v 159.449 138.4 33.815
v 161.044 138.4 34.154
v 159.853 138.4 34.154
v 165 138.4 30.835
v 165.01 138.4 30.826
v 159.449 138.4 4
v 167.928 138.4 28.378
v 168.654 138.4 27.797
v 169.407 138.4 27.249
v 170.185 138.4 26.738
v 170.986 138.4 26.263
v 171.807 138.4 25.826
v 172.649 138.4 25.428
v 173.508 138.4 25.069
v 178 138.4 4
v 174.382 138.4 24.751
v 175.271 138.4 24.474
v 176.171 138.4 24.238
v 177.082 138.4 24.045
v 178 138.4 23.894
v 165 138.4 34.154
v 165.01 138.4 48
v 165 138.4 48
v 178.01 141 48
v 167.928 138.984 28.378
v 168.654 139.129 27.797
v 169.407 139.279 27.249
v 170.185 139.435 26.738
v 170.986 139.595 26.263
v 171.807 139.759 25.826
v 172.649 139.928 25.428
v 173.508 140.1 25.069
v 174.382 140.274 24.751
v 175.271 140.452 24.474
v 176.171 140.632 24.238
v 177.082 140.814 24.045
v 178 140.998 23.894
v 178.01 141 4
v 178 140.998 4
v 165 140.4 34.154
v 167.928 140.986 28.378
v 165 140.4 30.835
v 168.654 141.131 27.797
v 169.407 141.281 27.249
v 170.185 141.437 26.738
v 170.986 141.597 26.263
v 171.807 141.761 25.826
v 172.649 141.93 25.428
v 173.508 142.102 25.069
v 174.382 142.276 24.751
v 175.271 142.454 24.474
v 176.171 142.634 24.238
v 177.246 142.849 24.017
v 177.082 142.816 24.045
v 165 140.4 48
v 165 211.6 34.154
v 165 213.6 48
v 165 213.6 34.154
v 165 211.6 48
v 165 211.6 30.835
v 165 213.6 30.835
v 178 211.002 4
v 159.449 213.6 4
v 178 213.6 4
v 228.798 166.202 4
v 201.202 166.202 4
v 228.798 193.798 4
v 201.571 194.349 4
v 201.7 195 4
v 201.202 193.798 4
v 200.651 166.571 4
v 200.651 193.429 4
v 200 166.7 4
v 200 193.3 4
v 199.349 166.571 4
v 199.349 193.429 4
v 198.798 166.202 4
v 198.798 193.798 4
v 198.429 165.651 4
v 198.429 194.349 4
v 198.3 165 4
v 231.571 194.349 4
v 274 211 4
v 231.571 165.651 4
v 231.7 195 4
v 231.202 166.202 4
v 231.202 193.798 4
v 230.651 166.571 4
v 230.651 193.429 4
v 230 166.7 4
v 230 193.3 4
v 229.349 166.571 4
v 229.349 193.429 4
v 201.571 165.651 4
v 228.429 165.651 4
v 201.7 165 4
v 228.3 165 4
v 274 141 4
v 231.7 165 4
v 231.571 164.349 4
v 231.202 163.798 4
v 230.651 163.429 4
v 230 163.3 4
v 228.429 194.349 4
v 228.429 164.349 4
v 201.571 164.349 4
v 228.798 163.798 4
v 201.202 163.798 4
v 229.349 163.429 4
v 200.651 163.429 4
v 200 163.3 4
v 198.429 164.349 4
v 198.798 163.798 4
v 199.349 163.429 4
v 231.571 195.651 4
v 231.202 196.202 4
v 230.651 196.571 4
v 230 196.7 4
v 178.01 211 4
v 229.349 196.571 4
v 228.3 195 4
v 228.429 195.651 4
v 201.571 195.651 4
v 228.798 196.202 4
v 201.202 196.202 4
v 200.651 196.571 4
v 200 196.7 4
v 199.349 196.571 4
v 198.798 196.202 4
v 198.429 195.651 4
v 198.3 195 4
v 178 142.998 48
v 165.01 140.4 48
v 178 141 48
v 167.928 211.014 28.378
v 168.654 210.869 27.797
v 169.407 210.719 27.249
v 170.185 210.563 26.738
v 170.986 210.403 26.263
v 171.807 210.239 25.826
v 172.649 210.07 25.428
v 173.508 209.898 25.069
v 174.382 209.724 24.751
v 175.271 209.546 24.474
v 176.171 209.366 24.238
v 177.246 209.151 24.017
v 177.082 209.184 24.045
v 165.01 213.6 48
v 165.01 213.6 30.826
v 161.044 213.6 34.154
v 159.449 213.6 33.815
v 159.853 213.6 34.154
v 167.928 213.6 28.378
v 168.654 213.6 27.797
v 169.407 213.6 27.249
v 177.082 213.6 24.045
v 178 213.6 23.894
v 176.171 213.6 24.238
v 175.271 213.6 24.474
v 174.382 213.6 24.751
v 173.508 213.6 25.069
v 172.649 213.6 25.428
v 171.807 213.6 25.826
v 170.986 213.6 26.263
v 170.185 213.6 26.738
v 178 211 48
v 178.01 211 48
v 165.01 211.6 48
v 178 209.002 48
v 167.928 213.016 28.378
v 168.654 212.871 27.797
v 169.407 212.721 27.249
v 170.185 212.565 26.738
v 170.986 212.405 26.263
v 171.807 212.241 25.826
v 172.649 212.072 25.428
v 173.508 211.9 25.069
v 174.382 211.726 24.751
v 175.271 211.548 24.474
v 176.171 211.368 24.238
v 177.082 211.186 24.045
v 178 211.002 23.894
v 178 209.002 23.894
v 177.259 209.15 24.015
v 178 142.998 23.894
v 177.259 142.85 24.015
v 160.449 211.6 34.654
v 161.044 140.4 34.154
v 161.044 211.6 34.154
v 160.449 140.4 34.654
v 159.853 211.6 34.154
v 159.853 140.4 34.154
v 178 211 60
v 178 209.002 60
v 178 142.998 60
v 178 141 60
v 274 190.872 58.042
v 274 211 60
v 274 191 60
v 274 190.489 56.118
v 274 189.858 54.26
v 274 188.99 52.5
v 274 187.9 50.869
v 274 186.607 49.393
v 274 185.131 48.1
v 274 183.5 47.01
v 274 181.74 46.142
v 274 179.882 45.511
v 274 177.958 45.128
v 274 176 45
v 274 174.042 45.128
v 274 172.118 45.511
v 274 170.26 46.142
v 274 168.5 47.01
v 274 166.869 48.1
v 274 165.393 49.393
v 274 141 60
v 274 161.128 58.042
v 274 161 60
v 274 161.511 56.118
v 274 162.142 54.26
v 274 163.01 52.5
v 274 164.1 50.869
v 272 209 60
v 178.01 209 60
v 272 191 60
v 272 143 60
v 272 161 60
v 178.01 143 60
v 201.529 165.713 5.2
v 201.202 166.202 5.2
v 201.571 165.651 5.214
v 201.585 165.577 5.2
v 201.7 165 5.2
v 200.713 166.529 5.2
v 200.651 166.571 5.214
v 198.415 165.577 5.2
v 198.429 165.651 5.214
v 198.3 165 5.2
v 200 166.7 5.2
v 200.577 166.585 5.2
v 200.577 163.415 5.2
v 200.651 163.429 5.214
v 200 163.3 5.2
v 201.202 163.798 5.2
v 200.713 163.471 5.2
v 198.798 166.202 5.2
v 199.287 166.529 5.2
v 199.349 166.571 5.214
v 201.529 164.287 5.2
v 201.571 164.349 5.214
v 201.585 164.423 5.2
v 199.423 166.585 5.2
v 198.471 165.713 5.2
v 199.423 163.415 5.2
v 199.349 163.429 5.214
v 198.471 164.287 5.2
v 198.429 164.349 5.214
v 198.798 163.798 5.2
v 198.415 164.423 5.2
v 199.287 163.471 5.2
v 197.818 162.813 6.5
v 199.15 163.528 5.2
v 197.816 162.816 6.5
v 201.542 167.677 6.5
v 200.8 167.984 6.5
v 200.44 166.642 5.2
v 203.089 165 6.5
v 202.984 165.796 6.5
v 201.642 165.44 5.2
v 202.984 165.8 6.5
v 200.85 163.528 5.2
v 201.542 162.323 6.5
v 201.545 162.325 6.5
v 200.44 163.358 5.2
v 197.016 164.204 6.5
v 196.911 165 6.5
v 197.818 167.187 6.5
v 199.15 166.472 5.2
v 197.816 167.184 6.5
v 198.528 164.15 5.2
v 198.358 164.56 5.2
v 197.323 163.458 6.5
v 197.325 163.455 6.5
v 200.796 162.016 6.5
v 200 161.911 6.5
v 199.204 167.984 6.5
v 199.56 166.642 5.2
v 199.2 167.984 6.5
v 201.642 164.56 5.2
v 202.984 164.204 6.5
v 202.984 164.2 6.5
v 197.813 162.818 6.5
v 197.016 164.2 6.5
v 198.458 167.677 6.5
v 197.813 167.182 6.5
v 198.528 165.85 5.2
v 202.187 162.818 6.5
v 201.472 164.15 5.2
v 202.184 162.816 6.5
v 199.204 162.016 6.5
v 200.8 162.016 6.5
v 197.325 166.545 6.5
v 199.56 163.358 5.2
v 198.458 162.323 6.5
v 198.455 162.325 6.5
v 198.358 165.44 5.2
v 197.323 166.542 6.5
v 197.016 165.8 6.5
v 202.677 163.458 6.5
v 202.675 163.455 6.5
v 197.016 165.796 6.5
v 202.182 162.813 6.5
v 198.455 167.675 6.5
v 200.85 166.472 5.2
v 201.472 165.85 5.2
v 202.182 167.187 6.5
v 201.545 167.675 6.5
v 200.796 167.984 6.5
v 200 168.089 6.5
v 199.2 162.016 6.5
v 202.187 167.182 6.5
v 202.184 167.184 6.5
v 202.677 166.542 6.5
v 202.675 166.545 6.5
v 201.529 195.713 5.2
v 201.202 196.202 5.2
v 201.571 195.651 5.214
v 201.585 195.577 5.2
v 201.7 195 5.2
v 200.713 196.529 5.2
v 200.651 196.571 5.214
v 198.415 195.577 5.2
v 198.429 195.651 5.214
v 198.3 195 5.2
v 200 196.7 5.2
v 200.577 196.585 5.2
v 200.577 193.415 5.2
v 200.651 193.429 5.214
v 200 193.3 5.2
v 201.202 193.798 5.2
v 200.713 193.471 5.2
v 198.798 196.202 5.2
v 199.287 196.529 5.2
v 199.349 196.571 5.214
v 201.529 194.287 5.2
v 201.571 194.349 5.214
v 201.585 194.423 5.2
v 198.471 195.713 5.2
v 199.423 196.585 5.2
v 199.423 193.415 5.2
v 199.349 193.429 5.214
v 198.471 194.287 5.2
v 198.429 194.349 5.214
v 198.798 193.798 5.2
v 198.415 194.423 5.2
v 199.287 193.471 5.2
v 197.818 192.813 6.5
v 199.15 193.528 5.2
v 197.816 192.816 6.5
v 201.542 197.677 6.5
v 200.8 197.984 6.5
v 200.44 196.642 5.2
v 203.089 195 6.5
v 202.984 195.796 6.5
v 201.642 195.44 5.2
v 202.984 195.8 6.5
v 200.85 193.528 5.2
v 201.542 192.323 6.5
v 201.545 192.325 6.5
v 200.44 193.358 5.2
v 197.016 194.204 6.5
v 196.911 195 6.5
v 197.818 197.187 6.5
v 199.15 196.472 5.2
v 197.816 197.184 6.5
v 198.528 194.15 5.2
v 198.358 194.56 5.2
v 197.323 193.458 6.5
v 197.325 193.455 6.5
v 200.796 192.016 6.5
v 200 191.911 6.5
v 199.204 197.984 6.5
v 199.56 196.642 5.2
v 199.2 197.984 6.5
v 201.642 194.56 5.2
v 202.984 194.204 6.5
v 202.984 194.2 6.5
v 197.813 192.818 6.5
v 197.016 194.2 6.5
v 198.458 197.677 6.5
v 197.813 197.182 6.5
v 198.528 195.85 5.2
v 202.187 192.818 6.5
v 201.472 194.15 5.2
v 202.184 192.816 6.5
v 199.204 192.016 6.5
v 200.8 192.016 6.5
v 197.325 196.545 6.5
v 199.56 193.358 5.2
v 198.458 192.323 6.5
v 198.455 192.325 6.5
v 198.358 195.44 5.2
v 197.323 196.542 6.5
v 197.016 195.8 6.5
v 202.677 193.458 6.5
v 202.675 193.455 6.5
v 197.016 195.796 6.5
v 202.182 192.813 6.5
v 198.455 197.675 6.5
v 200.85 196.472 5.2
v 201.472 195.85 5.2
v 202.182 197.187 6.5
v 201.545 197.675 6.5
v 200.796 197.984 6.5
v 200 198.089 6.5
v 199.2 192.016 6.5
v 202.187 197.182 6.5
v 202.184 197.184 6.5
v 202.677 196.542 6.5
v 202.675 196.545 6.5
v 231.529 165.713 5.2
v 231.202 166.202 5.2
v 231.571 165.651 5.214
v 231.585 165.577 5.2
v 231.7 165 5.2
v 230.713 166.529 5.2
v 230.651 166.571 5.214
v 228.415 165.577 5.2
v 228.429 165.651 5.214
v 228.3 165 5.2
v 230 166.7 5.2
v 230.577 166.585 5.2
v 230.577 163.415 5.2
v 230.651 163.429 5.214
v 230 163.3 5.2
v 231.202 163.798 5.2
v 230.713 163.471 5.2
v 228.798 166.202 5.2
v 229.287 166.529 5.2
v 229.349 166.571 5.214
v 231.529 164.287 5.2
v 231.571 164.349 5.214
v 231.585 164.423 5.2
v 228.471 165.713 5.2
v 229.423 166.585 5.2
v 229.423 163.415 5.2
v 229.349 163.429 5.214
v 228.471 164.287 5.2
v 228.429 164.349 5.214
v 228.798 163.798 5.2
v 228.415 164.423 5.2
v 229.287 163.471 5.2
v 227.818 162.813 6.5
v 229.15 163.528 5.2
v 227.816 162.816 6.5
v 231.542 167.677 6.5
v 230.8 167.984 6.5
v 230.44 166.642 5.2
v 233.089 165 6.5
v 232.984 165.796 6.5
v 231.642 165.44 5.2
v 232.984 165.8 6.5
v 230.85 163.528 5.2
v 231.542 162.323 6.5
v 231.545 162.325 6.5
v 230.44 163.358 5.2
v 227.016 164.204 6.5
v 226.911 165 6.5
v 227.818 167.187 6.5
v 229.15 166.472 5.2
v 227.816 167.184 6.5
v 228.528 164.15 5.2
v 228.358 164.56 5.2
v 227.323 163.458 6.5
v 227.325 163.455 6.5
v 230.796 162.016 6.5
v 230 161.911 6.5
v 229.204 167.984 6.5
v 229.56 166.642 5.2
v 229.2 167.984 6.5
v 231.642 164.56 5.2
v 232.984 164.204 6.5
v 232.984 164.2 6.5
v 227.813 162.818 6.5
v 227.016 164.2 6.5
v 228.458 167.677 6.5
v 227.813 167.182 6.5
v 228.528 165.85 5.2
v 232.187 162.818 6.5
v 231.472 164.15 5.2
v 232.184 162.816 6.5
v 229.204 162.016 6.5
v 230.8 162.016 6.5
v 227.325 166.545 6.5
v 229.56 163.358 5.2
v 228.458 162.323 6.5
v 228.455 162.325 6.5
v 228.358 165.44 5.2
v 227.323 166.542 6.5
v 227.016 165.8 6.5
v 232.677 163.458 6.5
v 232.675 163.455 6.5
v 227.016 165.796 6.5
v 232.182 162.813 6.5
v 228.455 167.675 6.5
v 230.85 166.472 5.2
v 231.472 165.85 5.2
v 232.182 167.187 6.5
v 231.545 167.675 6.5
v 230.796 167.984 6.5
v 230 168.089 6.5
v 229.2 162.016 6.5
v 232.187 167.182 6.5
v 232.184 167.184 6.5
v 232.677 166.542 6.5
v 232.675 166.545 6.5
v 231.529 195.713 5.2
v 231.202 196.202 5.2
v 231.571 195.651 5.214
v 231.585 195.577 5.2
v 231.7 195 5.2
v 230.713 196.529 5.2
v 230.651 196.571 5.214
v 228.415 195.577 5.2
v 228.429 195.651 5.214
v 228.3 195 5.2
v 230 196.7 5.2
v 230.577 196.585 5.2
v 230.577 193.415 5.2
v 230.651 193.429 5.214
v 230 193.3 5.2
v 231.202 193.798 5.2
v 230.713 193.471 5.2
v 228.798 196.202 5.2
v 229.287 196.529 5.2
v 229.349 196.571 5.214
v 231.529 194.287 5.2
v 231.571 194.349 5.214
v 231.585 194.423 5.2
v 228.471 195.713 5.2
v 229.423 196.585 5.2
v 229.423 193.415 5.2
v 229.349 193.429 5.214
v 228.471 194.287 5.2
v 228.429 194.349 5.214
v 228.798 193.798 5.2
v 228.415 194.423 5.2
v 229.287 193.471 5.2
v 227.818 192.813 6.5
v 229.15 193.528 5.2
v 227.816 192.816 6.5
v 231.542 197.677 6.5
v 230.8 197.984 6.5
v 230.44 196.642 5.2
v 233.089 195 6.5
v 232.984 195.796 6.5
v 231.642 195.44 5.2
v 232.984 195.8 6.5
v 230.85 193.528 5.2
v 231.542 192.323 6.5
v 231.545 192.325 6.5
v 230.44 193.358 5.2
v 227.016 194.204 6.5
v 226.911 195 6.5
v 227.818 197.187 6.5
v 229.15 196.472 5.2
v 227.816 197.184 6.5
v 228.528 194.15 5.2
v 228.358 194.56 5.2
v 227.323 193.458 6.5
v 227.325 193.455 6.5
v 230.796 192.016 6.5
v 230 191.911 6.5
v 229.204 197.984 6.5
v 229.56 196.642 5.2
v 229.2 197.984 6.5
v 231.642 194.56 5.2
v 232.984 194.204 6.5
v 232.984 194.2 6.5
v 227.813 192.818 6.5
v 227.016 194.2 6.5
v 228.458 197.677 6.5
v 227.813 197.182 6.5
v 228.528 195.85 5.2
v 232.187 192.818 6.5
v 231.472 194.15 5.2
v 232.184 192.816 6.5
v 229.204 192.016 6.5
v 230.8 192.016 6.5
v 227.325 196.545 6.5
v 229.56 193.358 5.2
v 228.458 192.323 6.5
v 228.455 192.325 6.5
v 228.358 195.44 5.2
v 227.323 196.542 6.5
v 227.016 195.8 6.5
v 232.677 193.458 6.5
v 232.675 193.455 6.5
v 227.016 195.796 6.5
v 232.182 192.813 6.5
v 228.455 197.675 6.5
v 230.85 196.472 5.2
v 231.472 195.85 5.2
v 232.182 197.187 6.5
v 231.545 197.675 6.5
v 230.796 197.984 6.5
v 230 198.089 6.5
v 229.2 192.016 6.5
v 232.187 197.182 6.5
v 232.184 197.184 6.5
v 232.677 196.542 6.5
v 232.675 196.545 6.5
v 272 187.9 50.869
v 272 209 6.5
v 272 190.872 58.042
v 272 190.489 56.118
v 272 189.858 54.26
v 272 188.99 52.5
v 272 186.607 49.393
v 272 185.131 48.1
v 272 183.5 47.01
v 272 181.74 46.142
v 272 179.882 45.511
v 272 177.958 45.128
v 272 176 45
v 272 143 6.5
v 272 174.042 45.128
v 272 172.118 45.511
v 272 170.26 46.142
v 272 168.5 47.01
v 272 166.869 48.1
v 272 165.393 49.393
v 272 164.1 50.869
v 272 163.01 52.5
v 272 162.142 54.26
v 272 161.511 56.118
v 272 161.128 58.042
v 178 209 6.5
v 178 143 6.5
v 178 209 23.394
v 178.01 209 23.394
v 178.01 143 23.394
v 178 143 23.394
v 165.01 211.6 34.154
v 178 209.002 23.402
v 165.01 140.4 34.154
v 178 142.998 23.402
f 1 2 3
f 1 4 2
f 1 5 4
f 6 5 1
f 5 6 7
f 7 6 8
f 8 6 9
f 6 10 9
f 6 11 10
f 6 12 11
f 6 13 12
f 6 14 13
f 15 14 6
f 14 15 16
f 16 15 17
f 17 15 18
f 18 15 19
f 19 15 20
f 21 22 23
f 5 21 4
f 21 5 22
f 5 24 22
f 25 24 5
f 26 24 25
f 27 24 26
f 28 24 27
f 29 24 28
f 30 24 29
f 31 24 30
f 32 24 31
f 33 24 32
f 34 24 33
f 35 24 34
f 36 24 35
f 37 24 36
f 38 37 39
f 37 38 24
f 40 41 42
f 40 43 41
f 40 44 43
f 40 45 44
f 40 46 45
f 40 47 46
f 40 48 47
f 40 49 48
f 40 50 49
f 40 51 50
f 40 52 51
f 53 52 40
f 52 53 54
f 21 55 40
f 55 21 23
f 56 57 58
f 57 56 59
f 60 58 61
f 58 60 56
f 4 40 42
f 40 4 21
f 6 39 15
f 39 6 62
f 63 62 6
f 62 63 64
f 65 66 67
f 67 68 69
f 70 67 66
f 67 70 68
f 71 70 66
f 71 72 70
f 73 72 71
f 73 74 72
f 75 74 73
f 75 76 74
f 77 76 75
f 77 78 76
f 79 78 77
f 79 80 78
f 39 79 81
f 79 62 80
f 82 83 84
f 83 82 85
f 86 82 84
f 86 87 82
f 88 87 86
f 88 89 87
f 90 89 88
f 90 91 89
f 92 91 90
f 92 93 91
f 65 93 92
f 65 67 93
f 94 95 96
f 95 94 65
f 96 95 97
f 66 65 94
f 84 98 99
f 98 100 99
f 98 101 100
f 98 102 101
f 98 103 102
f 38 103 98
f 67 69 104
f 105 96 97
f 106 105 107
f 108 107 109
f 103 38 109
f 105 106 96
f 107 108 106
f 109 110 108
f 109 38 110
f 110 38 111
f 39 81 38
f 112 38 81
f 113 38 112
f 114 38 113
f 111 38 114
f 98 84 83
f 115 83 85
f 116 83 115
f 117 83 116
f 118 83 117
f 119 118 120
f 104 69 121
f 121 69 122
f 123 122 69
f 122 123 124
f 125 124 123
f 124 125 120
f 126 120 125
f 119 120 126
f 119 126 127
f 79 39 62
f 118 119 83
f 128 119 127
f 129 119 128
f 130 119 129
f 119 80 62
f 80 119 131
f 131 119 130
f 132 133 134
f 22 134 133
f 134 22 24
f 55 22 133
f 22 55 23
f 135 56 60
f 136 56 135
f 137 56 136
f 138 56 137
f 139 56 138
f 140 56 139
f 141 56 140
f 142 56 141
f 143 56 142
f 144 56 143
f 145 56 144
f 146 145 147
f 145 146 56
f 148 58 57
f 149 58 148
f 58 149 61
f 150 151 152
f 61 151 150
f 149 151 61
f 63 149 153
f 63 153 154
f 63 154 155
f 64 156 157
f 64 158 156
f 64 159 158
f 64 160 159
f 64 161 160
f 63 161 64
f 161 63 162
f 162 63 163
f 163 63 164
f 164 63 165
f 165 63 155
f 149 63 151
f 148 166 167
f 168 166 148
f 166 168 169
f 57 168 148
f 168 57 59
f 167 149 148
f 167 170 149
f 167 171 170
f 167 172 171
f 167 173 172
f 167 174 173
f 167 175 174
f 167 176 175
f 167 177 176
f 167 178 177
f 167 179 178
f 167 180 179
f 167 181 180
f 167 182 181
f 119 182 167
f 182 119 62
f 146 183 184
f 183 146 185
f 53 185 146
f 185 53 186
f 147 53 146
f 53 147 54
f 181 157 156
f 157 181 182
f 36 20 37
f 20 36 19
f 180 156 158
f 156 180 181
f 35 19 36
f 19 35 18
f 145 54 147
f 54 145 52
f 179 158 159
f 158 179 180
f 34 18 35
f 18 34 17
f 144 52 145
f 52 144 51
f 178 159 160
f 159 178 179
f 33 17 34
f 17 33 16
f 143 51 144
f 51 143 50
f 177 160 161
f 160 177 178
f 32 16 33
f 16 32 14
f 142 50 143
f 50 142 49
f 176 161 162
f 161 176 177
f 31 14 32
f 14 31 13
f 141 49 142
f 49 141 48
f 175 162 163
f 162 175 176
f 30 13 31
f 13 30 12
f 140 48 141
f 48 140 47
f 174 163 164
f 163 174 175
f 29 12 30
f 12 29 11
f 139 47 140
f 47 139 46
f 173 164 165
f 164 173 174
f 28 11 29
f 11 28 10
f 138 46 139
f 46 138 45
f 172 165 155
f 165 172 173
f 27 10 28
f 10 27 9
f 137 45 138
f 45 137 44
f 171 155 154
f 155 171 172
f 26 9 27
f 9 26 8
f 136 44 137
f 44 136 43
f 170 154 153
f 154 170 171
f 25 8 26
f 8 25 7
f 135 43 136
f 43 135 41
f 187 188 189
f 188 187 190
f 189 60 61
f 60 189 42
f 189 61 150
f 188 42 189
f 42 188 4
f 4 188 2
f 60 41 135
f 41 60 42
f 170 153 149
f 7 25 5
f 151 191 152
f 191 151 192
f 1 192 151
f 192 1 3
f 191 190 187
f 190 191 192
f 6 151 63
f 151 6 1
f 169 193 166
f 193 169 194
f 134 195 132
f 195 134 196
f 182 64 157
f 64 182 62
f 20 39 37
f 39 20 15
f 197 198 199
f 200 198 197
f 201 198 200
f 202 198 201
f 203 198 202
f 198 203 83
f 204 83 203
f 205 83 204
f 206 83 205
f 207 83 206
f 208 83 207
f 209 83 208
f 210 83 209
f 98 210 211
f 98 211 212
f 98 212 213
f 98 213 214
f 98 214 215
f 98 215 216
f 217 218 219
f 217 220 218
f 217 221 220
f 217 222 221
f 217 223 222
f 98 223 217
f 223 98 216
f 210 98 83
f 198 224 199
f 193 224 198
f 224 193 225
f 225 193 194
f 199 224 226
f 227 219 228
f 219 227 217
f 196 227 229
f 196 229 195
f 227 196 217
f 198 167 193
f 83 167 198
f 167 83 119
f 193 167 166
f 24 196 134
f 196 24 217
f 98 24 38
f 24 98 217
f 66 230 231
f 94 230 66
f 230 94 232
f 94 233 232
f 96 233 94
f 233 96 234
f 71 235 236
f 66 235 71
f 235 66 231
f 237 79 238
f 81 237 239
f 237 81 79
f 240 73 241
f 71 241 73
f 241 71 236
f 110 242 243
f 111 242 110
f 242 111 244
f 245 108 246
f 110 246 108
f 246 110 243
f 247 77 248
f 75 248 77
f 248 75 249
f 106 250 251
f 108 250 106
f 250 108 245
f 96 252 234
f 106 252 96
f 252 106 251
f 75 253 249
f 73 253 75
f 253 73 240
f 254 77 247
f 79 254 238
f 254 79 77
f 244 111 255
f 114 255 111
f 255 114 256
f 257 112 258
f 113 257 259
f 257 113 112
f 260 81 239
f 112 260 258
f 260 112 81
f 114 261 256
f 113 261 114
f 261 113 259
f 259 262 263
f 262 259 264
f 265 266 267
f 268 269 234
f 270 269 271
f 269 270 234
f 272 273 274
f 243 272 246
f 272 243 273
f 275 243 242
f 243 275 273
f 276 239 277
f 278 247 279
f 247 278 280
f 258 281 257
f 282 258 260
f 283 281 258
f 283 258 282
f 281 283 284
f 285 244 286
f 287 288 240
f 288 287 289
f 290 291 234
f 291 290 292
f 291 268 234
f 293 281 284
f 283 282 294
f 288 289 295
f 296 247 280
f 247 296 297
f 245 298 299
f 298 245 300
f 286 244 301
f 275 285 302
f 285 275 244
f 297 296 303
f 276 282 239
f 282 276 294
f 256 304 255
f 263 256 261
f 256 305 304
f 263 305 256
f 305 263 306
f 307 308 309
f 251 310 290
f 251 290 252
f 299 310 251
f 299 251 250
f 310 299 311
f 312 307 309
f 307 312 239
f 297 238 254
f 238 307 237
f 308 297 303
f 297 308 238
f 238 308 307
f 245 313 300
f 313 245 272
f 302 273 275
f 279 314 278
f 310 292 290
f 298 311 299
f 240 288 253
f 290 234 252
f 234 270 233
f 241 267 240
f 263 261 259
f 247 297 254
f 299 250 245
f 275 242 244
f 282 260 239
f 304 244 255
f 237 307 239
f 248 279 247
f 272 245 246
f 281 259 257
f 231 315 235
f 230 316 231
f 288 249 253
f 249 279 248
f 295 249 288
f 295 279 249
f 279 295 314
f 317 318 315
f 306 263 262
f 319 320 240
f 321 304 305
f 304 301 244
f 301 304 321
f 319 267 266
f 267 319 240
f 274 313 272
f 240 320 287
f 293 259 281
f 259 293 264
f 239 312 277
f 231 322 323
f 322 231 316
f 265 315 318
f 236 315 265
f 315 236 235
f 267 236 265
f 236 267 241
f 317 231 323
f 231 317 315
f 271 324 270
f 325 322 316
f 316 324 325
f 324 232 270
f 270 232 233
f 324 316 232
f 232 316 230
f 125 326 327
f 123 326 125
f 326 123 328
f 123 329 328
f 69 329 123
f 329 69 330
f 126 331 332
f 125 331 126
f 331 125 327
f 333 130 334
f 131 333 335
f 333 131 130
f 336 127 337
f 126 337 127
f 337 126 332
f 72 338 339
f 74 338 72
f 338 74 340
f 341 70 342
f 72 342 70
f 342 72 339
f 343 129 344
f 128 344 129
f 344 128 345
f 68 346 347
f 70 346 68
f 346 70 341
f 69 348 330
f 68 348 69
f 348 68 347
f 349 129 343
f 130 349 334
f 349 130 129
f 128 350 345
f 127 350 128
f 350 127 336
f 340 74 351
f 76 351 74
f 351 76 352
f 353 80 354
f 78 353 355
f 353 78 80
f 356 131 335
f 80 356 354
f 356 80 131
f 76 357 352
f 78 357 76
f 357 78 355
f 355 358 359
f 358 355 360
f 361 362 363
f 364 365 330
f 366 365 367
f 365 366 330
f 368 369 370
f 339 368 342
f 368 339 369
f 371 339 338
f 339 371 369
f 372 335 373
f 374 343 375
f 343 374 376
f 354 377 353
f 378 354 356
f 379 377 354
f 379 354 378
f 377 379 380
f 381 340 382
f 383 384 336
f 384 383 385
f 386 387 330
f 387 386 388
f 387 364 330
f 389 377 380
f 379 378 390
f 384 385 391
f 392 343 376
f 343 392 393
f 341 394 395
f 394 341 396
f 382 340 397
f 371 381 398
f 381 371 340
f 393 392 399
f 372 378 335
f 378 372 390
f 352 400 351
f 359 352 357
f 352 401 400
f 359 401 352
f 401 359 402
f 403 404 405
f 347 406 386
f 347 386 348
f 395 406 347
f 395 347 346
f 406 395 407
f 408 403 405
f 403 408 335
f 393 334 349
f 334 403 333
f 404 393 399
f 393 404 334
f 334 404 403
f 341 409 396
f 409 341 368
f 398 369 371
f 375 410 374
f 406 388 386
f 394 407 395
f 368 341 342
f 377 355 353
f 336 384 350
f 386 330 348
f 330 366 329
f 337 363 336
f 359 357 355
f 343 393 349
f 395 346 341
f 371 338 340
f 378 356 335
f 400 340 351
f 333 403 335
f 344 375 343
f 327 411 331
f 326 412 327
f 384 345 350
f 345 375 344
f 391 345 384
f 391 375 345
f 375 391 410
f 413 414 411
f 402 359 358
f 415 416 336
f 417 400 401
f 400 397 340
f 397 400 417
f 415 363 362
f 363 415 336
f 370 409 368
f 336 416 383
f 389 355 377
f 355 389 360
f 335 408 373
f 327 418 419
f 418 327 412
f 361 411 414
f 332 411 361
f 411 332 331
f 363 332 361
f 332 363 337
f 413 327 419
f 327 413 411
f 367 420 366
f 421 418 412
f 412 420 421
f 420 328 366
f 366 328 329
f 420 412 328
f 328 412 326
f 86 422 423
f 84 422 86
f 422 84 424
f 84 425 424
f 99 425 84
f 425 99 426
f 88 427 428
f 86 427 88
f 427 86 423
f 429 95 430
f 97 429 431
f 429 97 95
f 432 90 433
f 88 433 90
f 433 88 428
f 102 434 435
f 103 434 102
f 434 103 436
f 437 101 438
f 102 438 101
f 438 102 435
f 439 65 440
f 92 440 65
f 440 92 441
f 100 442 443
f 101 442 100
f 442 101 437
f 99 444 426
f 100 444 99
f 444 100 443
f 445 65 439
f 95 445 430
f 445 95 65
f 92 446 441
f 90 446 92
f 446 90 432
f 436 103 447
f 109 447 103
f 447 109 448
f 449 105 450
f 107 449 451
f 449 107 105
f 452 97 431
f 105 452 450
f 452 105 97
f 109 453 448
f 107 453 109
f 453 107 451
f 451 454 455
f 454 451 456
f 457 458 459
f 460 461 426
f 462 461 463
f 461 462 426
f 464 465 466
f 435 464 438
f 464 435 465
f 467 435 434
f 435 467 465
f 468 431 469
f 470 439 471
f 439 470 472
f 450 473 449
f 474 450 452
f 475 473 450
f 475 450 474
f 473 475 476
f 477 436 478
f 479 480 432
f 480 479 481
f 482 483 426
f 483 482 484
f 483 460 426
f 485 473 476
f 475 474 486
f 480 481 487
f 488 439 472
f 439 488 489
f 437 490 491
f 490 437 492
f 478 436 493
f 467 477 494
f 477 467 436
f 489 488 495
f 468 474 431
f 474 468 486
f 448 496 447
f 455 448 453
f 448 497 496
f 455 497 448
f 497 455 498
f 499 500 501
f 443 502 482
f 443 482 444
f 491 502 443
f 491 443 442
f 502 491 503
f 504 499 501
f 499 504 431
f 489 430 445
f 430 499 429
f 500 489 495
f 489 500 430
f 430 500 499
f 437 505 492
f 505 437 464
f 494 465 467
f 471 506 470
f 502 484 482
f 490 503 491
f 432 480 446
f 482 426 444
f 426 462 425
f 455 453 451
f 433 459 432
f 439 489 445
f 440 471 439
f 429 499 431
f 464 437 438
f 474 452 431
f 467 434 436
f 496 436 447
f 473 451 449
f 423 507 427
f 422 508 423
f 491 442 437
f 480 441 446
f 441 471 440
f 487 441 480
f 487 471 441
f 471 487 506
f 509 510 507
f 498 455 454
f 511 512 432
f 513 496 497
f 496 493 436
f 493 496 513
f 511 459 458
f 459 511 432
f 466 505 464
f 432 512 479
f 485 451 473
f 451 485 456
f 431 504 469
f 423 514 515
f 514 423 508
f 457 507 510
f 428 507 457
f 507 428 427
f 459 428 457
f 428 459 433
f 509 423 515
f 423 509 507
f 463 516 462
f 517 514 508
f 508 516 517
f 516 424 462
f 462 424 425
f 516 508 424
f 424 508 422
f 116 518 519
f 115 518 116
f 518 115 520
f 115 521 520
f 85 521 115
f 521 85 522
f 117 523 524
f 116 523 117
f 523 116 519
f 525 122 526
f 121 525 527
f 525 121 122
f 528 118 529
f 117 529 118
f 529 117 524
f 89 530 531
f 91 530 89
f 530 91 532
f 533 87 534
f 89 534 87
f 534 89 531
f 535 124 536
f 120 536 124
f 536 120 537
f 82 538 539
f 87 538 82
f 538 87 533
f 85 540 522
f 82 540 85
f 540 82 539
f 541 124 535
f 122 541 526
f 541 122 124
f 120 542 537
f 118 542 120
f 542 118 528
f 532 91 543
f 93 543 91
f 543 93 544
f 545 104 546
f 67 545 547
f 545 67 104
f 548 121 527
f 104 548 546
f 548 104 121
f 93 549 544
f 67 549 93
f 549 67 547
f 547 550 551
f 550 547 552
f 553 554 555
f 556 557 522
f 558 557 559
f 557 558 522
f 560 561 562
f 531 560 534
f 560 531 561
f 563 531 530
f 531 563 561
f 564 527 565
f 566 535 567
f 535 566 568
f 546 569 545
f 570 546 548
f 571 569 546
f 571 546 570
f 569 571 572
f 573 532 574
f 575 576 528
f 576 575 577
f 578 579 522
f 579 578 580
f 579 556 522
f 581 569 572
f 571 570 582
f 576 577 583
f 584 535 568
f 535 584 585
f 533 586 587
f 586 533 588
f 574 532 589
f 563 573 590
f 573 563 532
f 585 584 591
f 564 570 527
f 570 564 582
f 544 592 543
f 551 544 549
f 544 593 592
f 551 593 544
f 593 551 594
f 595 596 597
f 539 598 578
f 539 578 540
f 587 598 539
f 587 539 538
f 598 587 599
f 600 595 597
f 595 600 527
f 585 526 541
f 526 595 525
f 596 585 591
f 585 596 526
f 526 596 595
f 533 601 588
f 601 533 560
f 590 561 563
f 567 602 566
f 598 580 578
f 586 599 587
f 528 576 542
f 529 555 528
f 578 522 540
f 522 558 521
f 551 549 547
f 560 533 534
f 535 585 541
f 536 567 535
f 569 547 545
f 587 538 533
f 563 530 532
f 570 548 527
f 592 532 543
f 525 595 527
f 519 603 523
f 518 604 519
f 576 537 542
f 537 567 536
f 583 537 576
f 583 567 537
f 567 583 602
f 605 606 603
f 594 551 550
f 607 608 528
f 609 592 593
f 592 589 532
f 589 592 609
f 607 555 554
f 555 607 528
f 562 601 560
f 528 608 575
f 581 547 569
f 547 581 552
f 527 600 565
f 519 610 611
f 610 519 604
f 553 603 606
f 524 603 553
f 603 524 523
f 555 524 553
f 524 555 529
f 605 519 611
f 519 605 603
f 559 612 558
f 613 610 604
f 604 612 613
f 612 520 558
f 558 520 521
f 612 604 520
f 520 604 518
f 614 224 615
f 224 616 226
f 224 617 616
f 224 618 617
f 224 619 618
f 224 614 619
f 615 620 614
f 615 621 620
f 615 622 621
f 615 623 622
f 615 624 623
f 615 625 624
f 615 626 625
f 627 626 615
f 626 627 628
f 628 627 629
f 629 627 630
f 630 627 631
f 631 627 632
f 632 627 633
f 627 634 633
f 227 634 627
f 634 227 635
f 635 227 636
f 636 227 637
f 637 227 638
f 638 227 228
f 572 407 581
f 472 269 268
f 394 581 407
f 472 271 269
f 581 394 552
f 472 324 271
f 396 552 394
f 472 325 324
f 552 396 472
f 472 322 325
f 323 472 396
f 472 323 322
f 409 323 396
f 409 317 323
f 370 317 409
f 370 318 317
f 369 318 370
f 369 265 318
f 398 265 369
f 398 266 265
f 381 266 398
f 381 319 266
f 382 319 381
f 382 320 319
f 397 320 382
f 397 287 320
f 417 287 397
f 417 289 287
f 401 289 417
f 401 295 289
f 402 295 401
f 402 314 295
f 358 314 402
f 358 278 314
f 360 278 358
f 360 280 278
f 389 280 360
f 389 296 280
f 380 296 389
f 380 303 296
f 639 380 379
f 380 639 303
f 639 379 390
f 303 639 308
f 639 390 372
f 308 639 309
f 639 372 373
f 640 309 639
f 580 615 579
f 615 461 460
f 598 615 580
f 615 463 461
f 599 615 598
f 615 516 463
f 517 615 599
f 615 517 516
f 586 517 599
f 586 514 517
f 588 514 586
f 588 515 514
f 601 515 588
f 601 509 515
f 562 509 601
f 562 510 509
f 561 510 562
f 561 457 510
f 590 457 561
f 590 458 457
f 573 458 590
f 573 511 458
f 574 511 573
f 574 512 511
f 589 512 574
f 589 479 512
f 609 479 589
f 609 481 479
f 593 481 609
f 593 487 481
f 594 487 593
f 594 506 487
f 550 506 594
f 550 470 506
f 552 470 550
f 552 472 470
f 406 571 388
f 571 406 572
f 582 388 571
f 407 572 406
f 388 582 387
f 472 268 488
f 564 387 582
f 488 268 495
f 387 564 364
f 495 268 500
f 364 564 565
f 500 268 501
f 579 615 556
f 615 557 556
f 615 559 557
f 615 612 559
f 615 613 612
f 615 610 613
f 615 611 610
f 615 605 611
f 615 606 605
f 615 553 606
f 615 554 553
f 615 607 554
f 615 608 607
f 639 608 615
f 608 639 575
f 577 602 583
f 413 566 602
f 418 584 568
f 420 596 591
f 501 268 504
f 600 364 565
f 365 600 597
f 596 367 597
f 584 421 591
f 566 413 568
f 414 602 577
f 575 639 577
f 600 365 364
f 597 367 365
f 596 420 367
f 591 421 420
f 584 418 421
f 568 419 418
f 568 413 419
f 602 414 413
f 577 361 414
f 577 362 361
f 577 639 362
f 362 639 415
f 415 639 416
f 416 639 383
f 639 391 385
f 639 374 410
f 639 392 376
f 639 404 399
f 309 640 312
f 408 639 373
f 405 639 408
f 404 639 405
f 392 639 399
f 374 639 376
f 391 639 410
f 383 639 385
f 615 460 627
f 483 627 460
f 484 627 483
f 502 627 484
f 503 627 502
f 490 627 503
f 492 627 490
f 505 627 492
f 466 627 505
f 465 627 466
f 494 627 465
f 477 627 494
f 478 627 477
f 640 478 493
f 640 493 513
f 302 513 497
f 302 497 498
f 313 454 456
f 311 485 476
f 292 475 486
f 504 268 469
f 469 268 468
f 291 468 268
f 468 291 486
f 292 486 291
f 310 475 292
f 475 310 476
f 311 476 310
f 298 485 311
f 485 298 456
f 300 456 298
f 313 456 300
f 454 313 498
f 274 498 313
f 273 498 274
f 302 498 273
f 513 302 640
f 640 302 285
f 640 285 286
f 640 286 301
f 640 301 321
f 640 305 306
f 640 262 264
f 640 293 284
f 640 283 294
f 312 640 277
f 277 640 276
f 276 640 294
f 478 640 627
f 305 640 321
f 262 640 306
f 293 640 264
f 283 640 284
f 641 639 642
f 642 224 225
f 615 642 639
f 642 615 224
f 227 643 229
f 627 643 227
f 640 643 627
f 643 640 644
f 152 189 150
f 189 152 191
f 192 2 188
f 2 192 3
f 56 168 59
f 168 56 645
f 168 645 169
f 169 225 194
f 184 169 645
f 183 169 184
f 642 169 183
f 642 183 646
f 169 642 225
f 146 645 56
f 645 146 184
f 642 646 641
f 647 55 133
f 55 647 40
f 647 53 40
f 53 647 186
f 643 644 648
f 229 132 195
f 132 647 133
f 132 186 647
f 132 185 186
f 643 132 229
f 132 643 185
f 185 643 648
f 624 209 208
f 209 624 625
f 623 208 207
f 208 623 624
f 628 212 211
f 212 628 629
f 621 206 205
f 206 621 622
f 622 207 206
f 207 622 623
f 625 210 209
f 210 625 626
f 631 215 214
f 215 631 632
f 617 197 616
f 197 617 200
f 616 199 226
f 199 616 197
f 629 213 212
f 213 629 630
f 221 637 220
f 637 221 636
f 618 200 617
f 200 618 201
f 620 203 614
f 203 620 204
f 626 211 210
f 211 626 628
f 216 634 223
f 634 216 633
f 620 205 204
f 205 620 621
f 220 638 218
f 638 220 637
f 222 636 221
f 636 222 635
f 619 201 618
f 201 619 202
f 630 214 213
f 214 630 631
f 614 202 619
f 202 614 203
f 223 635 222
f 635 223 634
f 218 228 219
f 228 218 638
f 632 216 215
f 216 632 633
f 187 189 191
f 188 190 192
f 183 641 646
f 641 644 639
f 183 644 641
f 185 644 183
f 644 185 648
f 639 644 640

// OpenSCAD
// file: machine_frame.scad
// =============================================
// Riftbound Card Sorter — shared machine frame
// =============================================
// Single source of truth for the card path after the Nov 11 redesign
// (suction pick from a motor-raised hopper, raised transport line,
// cradle shuttle sorter). Machine coords as in assembly.scad:
//   X = card travel (hopper -> belt -> tray), Y = across belt (+Y = back,
//   electronics side), Z = up, Z=0 bottom of baseplate tiles.
// `use <machine_frame.scad>` does not import variables, so read these via
// the functions at the bottom.
// =============================================

base_top   = 4;      // top of baseplate tiles
riser_h    = 60;     // conveyor deck raised so cards can FALL into both tray floors
deck_z     = base_top + riser_h;          // rail base / hopper deck reference = 64

// Conveyor (geometry unchanged, just lifted by riser_h)
belt_x0    = -165;   // belt start
belt_x1    = 85;     // belt end
roller_x   = [-140, 60];
rail_in    = 45;     // |Y| of rail inner faces
shaft_z    = deck_z + 15;
card_z     = deck_z + 15 + 11.9;          // top of round belts = card face = 90.9
scan_flat  = [-127, 47];                  // slide-bed backed flat zone (X)

// Scanner
cam_x      = 5;      // lens axis; card centred here for capture (moved from -40 so the hood clears the arm drop zone at X -139..-51)

// Hopper (motor-raised floor keeps top card at card_z)
hopper_x   = -215;   // cavity centre X (Y = 0)

// Baseplate extents (3x3 tiles of 190x180)
base_x     = [-285, 285];
base_y     = [-270, 270];

// Pick & place hand-off
drop_x     = -95;    // card CENTRE when the suction arm releases it onto the belt
                     // (card spans -139..-51: on belts, clear of hopper wall)
drop_clear = 3;      // card underside this far above belt at release (low drop)

// Sorting tray (bottom on baseplate); owner of tray placement may move it in X
tray_floor_lower_z = base_top + 2.5;      // lower slot floor
tray_floor_upper_z = base_top + 65 + 3 + 2.5;  // = 74.5 upper slot floor

// Card
card_w = 63; card_l = 88; card_t = 0.33;  // RAW cards (owner confirmed 2026-11-11: no sleeves), ~1.75 g

function frame_base_top()  = base_top;
function frame_riser_h()   = riser_h;
function frame_deck_z()    = deck_z;
function frame_belt_x0()   = belt_x0;
function frame_belt_x1()   = belt_x1;
function frame_roller_x()  = roller_x;
function frame_rail_in()   = rail_in;
function frame_card_z()    = card_z;
function frame_scan_flat() = scan_flat;
function frame_cam_x()     = cam_x;
function frame_hopper_x()  = hopper_x;
function frame_base_x()    = base_x;
function frame_base_y()    = base_y;
function frame_drop_x()    = drop_x;
function frame_drop_clear()= drop_clear;
function frame_tray_floor_lower_z() = tray_floor_lower_z;
function frame_tray_floor_upper_z() = tray_floor_upper_z;
// main file
// =============================================
// Riftbound Card Sorter — Reject Bin (bin 9)
// =============================================
// Open box beside the sorting tray at the shuttle's reject position
// (carriage Y 176; tray ends at Y 137). The shuttle tips the card in the
// LOWER pose; a lane with the same −40° → −8° ramp profile as the lower
// ramp (shuttle_geom.scad) slides it into the box. Box inner 66 × 94 mm,
// floor Z 6.5, walls to Z 60, open top for emptying.
//
// PRINT: 1 piece, 113 × 72 × 60 mm, upright, PLA 0.2 mm, 3 walls, 15 %.
//   The lane surface prints as a 40°→8° slope (layer steps face downhill).
// FASTEN: 4× M3 countersunk through the box floor into the baseplate grid
//   (X 200, 230; Y 165, 195), nut under the board.
// =============================================

use <shuttle_geom.scad>

/* [Export] */
part = "assembly";   // assembly | reject_bin

$fn = 32;
eps = 0.01;
yc   = sg_reject_y();          // 176
xt   = sg_tray_x0();           // 175 — lane exit = box rear inner face
prof = sg_ramp_profile();
x0   = sg_ramp_x0() - 1;
wall = 2;
in_hw = 33;                    // box inner half-width (66)
lane_hw = 35.6;                // lane entry half-width (cradle is ±35.2)
box_x1 = xt + 94;              // inner front face
floor_z = sg_base_top() + 2.5; // 6.5
top_z  = 60;

module xz(y0, y1) translate([0, y1, 0]) rotate([90, 0, 0]) linear_extrude(y1 - y0) children();
module lane_2d()
    polygon(concat([[x0, sg_base_top()], [x0, prof[0][1] - 1.0 * tan(sg_kick_lower_a())]],
                   prof, [[xt, prof[len(prof) - 1][1]], [xt, sg_base_top()]]));

module reject_bin() {
    difference() {
        union() {
            // lane body
            xz(yc - lane_hw - wall, yc + lane_hw + wall) lane_2d();
            // lane side walls (funnel 71.2 → 66), from X 165 so the tipped cradle's corners clear them
            for (s = [-1, 1]) hull() {
                translate([165, yc + s * (lane_hw + wall / 2) - wall / 2, sg_base_top()]) cube([eps, wall, 48 - sg_base_top()]);
                translate([xt, yc + s * (in_hw + wall / 2) - wall / 2, sg_base_top()]) cube([eps, wall, 48 - sg_base_top()]);
            }
            // box
            translate([xt, yc - in_hw - wall, sg_base_top()]) cube([box_x1 + wall - xt, 2 * (in_hw + wall), top_z - sg_base_top()]);
        }
        // box cavity
        translate([xt - eps, yc - in_hw, floor_z]) cube([box_x1 - xt + eps, 2 * in_hw, top_z]);
        // lane cavity above the surface between the walls (funnel)
        hull() {
            translate([x0 - 1, yc - lane_hw - wall - 1, prof[0][1] - 0.5]) cube([165 - x0 + 1, 2 * (lane_hw + wall + 1), 60]);
        }
        hull() {
            translate([165, yc - lane_hw, prof[0][1] - 0.5]) cube([eps, 2 * lane_hw, 60]);
            translate([xt, yc - in_hw, prof[len(prof) - 1][1] - 0.5]) cube([eps, 2 * in_hw, 60]);
        }
        // countersunk M3 to the baseplate
        for (x = [200, 230]) for (y = [165, 195]) translate([x, y, 0]) {
            cylinder(d = 3.4, h = 20, $fn = 16);
            translate([0, 0, floor_z - 1.3]) cylinder(d1 = 3.4, d2 = 6.2, h = 1.31, $fn = 24);
        }
        // finger notch on the front wall for emptying
        translate([box_x1 - 1, yc, top_z]) rotate([0, 90, 0]) cylinder(d = 30, h = wall + 2, $fn = 48);
    }
    // restore the lane surface inside the funnel cut
    intersection() {
        xz(yc - lane_hw, yc + lane_hw) lane_2d();
        union() {
            translate([x0 - 1, yc - lane_hw - wall, 0]) cube([165 - x0 + 1 + eps, 2 * (lane_hw + wall), 60]);
            hull() {
                translate([165, yc - lane_hw, 0]) cube([eps, 2 * lane_hw, 60]);
                translate([xt, yc - in_hw, 0]) cube([eps, 2 * in_hw, 60]);
            }
        }
    }
}

module asm_reject_bin() color("IndianRed") reject_bin();

if (part == "assembly" || part == "reject_bin") reject_bin();
